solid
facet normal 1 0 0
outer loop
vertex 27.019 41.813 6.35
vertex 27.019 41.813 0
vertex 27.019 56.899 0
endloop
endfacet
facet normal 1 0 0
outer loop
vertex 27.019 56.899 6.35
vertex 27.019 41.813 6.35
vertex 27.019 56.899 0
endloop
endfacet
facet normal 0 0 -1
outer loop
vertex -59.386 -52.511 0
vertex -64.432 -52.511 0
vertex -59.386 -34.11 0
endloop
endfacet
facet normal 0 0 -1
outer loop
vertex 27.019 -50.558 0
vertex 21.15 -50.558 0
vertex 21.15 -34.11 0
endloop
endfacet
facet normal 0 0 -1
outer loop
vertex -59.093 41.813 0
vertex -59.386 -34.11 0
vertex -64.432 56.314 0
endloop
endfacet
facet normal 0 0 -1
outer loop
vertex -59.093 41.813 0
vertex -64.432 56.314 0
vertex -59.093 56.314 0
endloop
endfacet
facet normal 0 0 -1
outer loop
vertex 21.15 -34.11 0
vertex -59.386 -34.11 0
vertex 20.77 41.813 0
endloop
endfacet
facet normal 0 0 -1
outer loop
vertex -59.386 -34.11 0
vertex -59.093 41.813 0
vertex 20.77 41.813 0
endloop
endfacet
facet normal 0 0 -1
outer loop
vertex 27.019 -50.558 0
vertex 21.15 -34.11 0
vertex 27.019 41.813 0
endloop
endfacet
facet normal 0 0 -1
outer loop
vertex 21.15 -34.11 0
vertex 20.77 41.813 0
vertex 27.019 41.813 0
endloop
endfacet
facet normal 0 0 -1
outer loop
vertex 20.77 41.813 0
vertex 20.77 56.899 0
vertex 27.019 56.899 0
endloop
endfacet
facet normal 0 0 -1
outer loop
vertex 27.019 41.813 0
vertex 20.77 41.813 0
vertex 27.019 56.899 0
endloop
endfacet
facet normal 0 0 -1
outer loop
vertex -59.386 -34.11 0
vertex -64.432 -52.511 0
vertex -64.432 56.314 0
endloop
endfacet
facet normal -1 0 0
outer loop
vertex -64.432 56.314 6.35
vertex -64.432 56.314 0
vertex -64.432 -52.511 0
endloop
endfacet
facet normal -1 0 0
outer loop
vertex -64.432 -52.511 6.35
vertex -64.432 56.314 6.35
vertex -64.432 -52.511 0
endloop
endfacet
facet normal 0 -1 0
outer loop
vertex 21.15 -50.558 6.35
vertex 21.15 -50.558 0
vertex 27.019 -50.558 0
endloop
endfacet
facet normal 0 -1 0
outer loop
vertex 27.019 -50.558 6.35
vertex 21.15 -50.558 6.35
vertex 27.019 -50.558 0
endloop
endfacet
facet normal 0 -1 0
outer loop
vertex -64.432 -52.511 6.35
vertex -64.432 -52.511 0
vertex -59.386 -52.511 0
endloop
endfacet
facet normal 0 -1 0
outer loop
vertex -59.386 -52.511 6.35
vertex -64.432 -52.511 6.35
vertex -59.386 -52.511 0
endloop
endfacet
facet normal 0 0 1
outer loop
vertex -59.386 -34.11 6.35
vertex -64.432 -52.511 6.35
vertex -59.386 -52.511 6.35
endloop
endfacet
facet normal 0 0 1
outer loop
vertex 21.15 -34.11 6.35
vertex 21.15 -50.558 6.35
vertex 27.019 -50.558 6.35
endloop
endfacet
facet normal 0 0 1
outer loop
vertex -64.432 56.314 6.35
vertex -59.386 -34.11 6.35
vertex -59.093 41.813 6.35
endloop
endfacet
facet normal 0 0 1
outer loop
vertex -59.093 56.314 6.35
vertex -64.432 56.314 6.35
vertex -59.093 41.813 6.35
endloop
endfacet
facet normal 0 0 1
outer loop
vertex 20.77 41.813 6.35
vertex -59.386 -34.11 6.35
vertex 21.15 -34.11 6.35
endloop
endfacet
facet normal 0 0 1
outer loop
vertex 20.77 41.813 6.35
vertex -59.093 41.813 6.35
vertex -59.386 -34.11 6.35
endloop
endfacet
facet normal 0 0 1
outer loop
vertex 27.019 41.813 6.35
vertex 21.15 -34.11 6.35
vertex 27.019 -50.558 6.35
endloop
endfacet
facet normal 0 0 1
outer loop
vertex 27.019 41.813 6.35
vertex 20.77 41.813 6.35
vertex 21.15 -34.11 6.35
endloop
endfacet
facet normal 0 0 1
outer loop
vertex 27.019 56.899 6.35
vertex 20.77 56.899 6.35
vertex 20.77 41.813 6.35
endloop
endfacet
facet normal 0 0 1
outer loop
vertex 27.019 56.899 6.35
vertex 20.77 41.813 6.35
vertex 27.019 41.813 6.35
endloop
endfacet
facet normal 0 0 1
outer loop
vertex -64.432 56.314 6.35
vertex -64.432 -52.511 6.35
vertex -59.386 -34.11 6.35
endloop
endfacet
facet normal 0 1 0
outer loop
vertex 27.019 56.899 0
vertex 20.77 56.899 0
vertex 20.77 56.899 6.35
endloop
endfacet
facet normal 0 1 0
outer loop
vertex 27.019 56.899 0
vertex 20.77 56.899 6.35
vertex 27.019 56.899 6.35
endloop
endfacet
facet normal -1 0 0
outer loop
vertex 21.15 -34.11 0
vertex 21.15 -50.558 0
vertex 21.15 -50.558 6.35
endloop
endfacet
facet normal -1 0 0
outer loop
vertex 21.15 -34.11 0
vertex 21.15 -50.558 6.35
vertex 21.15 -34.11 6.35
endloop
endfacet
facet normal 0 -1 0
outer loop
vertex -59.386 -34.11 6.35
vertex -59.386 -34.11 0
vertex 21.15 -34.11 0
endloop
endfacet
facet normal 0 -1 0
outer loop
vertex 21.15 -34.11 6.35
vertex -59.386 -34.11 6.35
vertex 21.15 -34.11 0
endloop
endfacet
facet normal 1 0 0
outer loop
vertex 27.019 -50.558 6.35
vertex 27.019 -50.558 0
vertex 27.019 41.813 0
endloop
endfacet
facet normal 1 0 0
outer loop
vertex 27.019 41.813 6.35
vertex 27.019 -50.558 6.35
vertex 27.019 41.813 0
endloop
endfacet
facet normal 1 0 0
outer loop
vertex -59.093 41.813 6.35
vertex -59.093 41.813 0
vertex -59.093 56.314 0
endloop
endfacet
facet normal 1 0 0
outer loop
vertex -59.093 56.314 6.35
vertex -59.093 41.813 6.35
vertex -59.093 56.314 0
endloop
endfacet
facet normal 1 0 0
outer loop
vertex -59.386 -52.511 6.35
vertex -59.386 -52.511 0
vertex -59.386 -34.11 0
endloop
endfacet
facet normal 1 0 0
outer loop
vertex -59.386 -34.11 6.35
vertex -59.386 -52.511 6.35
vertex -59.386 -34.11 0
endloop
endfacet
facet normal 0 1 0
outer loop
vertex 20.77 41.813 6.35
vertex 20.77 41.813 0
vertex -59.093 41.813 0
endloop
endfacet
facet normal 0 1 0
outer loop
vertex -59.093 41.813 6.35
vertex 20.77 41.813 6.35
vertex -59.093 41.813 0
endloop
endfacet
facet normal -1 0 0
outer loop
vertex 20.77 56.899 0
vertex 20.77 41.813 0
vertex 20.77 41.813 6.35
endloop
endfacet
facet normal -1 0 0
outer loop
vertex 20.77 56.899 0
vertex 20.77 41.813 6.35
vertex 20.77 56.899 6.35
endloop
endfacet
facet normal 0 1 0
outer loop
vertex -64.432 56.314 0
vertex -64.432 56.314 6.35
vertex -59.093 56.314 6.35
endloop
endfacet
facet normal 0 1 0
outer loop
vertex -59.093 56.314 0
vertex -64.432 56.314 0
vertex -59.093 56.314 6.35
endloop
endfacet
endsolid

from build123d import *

# Parameters (mm, degrees)
F0_W     = 5.869098
F0_H     = 16.448125
F0_W_2   = 6.248793
F0_H_2   = 15.086499
F0_W_3   = 5.045854
F0_H_3   = 18.400892
F0_W_4   = 5.338394
F0_H_4   = 14.501419
F1_DEPTH = 6.35


with BuildPart() as f1:
    # F0 (on Top) → F1 (new body)
    with BuildSketch(Plane.XY):
        with Locations((24.084667, -42.334303)):
            Rectangle(F0_W, F0_H)
        Polygon((21.150118, -34.110241), (27.019216, -34.110241), (27.019216, 41.812751), (20.770423, 41.812751), (-59.093311, 41.812751), (-64.431705, 41.812751), (-64.431705, -34.110241), (-59.385851, -34.110241), align=None)
        with Locations((23.894819, 49.356)):
            Rectangle(F0_W_2, F0_H_2)
        with Locations((-61.908778, -43.310687)):
            Rectangle(F0_W_3, F0_H_3)
        with Locations((-61.762508, 49.06346)):
            Rectangle(F0_W_4, F0_H_4)
    extrude(amount=F1_DEPTH)


solid = f1.part
